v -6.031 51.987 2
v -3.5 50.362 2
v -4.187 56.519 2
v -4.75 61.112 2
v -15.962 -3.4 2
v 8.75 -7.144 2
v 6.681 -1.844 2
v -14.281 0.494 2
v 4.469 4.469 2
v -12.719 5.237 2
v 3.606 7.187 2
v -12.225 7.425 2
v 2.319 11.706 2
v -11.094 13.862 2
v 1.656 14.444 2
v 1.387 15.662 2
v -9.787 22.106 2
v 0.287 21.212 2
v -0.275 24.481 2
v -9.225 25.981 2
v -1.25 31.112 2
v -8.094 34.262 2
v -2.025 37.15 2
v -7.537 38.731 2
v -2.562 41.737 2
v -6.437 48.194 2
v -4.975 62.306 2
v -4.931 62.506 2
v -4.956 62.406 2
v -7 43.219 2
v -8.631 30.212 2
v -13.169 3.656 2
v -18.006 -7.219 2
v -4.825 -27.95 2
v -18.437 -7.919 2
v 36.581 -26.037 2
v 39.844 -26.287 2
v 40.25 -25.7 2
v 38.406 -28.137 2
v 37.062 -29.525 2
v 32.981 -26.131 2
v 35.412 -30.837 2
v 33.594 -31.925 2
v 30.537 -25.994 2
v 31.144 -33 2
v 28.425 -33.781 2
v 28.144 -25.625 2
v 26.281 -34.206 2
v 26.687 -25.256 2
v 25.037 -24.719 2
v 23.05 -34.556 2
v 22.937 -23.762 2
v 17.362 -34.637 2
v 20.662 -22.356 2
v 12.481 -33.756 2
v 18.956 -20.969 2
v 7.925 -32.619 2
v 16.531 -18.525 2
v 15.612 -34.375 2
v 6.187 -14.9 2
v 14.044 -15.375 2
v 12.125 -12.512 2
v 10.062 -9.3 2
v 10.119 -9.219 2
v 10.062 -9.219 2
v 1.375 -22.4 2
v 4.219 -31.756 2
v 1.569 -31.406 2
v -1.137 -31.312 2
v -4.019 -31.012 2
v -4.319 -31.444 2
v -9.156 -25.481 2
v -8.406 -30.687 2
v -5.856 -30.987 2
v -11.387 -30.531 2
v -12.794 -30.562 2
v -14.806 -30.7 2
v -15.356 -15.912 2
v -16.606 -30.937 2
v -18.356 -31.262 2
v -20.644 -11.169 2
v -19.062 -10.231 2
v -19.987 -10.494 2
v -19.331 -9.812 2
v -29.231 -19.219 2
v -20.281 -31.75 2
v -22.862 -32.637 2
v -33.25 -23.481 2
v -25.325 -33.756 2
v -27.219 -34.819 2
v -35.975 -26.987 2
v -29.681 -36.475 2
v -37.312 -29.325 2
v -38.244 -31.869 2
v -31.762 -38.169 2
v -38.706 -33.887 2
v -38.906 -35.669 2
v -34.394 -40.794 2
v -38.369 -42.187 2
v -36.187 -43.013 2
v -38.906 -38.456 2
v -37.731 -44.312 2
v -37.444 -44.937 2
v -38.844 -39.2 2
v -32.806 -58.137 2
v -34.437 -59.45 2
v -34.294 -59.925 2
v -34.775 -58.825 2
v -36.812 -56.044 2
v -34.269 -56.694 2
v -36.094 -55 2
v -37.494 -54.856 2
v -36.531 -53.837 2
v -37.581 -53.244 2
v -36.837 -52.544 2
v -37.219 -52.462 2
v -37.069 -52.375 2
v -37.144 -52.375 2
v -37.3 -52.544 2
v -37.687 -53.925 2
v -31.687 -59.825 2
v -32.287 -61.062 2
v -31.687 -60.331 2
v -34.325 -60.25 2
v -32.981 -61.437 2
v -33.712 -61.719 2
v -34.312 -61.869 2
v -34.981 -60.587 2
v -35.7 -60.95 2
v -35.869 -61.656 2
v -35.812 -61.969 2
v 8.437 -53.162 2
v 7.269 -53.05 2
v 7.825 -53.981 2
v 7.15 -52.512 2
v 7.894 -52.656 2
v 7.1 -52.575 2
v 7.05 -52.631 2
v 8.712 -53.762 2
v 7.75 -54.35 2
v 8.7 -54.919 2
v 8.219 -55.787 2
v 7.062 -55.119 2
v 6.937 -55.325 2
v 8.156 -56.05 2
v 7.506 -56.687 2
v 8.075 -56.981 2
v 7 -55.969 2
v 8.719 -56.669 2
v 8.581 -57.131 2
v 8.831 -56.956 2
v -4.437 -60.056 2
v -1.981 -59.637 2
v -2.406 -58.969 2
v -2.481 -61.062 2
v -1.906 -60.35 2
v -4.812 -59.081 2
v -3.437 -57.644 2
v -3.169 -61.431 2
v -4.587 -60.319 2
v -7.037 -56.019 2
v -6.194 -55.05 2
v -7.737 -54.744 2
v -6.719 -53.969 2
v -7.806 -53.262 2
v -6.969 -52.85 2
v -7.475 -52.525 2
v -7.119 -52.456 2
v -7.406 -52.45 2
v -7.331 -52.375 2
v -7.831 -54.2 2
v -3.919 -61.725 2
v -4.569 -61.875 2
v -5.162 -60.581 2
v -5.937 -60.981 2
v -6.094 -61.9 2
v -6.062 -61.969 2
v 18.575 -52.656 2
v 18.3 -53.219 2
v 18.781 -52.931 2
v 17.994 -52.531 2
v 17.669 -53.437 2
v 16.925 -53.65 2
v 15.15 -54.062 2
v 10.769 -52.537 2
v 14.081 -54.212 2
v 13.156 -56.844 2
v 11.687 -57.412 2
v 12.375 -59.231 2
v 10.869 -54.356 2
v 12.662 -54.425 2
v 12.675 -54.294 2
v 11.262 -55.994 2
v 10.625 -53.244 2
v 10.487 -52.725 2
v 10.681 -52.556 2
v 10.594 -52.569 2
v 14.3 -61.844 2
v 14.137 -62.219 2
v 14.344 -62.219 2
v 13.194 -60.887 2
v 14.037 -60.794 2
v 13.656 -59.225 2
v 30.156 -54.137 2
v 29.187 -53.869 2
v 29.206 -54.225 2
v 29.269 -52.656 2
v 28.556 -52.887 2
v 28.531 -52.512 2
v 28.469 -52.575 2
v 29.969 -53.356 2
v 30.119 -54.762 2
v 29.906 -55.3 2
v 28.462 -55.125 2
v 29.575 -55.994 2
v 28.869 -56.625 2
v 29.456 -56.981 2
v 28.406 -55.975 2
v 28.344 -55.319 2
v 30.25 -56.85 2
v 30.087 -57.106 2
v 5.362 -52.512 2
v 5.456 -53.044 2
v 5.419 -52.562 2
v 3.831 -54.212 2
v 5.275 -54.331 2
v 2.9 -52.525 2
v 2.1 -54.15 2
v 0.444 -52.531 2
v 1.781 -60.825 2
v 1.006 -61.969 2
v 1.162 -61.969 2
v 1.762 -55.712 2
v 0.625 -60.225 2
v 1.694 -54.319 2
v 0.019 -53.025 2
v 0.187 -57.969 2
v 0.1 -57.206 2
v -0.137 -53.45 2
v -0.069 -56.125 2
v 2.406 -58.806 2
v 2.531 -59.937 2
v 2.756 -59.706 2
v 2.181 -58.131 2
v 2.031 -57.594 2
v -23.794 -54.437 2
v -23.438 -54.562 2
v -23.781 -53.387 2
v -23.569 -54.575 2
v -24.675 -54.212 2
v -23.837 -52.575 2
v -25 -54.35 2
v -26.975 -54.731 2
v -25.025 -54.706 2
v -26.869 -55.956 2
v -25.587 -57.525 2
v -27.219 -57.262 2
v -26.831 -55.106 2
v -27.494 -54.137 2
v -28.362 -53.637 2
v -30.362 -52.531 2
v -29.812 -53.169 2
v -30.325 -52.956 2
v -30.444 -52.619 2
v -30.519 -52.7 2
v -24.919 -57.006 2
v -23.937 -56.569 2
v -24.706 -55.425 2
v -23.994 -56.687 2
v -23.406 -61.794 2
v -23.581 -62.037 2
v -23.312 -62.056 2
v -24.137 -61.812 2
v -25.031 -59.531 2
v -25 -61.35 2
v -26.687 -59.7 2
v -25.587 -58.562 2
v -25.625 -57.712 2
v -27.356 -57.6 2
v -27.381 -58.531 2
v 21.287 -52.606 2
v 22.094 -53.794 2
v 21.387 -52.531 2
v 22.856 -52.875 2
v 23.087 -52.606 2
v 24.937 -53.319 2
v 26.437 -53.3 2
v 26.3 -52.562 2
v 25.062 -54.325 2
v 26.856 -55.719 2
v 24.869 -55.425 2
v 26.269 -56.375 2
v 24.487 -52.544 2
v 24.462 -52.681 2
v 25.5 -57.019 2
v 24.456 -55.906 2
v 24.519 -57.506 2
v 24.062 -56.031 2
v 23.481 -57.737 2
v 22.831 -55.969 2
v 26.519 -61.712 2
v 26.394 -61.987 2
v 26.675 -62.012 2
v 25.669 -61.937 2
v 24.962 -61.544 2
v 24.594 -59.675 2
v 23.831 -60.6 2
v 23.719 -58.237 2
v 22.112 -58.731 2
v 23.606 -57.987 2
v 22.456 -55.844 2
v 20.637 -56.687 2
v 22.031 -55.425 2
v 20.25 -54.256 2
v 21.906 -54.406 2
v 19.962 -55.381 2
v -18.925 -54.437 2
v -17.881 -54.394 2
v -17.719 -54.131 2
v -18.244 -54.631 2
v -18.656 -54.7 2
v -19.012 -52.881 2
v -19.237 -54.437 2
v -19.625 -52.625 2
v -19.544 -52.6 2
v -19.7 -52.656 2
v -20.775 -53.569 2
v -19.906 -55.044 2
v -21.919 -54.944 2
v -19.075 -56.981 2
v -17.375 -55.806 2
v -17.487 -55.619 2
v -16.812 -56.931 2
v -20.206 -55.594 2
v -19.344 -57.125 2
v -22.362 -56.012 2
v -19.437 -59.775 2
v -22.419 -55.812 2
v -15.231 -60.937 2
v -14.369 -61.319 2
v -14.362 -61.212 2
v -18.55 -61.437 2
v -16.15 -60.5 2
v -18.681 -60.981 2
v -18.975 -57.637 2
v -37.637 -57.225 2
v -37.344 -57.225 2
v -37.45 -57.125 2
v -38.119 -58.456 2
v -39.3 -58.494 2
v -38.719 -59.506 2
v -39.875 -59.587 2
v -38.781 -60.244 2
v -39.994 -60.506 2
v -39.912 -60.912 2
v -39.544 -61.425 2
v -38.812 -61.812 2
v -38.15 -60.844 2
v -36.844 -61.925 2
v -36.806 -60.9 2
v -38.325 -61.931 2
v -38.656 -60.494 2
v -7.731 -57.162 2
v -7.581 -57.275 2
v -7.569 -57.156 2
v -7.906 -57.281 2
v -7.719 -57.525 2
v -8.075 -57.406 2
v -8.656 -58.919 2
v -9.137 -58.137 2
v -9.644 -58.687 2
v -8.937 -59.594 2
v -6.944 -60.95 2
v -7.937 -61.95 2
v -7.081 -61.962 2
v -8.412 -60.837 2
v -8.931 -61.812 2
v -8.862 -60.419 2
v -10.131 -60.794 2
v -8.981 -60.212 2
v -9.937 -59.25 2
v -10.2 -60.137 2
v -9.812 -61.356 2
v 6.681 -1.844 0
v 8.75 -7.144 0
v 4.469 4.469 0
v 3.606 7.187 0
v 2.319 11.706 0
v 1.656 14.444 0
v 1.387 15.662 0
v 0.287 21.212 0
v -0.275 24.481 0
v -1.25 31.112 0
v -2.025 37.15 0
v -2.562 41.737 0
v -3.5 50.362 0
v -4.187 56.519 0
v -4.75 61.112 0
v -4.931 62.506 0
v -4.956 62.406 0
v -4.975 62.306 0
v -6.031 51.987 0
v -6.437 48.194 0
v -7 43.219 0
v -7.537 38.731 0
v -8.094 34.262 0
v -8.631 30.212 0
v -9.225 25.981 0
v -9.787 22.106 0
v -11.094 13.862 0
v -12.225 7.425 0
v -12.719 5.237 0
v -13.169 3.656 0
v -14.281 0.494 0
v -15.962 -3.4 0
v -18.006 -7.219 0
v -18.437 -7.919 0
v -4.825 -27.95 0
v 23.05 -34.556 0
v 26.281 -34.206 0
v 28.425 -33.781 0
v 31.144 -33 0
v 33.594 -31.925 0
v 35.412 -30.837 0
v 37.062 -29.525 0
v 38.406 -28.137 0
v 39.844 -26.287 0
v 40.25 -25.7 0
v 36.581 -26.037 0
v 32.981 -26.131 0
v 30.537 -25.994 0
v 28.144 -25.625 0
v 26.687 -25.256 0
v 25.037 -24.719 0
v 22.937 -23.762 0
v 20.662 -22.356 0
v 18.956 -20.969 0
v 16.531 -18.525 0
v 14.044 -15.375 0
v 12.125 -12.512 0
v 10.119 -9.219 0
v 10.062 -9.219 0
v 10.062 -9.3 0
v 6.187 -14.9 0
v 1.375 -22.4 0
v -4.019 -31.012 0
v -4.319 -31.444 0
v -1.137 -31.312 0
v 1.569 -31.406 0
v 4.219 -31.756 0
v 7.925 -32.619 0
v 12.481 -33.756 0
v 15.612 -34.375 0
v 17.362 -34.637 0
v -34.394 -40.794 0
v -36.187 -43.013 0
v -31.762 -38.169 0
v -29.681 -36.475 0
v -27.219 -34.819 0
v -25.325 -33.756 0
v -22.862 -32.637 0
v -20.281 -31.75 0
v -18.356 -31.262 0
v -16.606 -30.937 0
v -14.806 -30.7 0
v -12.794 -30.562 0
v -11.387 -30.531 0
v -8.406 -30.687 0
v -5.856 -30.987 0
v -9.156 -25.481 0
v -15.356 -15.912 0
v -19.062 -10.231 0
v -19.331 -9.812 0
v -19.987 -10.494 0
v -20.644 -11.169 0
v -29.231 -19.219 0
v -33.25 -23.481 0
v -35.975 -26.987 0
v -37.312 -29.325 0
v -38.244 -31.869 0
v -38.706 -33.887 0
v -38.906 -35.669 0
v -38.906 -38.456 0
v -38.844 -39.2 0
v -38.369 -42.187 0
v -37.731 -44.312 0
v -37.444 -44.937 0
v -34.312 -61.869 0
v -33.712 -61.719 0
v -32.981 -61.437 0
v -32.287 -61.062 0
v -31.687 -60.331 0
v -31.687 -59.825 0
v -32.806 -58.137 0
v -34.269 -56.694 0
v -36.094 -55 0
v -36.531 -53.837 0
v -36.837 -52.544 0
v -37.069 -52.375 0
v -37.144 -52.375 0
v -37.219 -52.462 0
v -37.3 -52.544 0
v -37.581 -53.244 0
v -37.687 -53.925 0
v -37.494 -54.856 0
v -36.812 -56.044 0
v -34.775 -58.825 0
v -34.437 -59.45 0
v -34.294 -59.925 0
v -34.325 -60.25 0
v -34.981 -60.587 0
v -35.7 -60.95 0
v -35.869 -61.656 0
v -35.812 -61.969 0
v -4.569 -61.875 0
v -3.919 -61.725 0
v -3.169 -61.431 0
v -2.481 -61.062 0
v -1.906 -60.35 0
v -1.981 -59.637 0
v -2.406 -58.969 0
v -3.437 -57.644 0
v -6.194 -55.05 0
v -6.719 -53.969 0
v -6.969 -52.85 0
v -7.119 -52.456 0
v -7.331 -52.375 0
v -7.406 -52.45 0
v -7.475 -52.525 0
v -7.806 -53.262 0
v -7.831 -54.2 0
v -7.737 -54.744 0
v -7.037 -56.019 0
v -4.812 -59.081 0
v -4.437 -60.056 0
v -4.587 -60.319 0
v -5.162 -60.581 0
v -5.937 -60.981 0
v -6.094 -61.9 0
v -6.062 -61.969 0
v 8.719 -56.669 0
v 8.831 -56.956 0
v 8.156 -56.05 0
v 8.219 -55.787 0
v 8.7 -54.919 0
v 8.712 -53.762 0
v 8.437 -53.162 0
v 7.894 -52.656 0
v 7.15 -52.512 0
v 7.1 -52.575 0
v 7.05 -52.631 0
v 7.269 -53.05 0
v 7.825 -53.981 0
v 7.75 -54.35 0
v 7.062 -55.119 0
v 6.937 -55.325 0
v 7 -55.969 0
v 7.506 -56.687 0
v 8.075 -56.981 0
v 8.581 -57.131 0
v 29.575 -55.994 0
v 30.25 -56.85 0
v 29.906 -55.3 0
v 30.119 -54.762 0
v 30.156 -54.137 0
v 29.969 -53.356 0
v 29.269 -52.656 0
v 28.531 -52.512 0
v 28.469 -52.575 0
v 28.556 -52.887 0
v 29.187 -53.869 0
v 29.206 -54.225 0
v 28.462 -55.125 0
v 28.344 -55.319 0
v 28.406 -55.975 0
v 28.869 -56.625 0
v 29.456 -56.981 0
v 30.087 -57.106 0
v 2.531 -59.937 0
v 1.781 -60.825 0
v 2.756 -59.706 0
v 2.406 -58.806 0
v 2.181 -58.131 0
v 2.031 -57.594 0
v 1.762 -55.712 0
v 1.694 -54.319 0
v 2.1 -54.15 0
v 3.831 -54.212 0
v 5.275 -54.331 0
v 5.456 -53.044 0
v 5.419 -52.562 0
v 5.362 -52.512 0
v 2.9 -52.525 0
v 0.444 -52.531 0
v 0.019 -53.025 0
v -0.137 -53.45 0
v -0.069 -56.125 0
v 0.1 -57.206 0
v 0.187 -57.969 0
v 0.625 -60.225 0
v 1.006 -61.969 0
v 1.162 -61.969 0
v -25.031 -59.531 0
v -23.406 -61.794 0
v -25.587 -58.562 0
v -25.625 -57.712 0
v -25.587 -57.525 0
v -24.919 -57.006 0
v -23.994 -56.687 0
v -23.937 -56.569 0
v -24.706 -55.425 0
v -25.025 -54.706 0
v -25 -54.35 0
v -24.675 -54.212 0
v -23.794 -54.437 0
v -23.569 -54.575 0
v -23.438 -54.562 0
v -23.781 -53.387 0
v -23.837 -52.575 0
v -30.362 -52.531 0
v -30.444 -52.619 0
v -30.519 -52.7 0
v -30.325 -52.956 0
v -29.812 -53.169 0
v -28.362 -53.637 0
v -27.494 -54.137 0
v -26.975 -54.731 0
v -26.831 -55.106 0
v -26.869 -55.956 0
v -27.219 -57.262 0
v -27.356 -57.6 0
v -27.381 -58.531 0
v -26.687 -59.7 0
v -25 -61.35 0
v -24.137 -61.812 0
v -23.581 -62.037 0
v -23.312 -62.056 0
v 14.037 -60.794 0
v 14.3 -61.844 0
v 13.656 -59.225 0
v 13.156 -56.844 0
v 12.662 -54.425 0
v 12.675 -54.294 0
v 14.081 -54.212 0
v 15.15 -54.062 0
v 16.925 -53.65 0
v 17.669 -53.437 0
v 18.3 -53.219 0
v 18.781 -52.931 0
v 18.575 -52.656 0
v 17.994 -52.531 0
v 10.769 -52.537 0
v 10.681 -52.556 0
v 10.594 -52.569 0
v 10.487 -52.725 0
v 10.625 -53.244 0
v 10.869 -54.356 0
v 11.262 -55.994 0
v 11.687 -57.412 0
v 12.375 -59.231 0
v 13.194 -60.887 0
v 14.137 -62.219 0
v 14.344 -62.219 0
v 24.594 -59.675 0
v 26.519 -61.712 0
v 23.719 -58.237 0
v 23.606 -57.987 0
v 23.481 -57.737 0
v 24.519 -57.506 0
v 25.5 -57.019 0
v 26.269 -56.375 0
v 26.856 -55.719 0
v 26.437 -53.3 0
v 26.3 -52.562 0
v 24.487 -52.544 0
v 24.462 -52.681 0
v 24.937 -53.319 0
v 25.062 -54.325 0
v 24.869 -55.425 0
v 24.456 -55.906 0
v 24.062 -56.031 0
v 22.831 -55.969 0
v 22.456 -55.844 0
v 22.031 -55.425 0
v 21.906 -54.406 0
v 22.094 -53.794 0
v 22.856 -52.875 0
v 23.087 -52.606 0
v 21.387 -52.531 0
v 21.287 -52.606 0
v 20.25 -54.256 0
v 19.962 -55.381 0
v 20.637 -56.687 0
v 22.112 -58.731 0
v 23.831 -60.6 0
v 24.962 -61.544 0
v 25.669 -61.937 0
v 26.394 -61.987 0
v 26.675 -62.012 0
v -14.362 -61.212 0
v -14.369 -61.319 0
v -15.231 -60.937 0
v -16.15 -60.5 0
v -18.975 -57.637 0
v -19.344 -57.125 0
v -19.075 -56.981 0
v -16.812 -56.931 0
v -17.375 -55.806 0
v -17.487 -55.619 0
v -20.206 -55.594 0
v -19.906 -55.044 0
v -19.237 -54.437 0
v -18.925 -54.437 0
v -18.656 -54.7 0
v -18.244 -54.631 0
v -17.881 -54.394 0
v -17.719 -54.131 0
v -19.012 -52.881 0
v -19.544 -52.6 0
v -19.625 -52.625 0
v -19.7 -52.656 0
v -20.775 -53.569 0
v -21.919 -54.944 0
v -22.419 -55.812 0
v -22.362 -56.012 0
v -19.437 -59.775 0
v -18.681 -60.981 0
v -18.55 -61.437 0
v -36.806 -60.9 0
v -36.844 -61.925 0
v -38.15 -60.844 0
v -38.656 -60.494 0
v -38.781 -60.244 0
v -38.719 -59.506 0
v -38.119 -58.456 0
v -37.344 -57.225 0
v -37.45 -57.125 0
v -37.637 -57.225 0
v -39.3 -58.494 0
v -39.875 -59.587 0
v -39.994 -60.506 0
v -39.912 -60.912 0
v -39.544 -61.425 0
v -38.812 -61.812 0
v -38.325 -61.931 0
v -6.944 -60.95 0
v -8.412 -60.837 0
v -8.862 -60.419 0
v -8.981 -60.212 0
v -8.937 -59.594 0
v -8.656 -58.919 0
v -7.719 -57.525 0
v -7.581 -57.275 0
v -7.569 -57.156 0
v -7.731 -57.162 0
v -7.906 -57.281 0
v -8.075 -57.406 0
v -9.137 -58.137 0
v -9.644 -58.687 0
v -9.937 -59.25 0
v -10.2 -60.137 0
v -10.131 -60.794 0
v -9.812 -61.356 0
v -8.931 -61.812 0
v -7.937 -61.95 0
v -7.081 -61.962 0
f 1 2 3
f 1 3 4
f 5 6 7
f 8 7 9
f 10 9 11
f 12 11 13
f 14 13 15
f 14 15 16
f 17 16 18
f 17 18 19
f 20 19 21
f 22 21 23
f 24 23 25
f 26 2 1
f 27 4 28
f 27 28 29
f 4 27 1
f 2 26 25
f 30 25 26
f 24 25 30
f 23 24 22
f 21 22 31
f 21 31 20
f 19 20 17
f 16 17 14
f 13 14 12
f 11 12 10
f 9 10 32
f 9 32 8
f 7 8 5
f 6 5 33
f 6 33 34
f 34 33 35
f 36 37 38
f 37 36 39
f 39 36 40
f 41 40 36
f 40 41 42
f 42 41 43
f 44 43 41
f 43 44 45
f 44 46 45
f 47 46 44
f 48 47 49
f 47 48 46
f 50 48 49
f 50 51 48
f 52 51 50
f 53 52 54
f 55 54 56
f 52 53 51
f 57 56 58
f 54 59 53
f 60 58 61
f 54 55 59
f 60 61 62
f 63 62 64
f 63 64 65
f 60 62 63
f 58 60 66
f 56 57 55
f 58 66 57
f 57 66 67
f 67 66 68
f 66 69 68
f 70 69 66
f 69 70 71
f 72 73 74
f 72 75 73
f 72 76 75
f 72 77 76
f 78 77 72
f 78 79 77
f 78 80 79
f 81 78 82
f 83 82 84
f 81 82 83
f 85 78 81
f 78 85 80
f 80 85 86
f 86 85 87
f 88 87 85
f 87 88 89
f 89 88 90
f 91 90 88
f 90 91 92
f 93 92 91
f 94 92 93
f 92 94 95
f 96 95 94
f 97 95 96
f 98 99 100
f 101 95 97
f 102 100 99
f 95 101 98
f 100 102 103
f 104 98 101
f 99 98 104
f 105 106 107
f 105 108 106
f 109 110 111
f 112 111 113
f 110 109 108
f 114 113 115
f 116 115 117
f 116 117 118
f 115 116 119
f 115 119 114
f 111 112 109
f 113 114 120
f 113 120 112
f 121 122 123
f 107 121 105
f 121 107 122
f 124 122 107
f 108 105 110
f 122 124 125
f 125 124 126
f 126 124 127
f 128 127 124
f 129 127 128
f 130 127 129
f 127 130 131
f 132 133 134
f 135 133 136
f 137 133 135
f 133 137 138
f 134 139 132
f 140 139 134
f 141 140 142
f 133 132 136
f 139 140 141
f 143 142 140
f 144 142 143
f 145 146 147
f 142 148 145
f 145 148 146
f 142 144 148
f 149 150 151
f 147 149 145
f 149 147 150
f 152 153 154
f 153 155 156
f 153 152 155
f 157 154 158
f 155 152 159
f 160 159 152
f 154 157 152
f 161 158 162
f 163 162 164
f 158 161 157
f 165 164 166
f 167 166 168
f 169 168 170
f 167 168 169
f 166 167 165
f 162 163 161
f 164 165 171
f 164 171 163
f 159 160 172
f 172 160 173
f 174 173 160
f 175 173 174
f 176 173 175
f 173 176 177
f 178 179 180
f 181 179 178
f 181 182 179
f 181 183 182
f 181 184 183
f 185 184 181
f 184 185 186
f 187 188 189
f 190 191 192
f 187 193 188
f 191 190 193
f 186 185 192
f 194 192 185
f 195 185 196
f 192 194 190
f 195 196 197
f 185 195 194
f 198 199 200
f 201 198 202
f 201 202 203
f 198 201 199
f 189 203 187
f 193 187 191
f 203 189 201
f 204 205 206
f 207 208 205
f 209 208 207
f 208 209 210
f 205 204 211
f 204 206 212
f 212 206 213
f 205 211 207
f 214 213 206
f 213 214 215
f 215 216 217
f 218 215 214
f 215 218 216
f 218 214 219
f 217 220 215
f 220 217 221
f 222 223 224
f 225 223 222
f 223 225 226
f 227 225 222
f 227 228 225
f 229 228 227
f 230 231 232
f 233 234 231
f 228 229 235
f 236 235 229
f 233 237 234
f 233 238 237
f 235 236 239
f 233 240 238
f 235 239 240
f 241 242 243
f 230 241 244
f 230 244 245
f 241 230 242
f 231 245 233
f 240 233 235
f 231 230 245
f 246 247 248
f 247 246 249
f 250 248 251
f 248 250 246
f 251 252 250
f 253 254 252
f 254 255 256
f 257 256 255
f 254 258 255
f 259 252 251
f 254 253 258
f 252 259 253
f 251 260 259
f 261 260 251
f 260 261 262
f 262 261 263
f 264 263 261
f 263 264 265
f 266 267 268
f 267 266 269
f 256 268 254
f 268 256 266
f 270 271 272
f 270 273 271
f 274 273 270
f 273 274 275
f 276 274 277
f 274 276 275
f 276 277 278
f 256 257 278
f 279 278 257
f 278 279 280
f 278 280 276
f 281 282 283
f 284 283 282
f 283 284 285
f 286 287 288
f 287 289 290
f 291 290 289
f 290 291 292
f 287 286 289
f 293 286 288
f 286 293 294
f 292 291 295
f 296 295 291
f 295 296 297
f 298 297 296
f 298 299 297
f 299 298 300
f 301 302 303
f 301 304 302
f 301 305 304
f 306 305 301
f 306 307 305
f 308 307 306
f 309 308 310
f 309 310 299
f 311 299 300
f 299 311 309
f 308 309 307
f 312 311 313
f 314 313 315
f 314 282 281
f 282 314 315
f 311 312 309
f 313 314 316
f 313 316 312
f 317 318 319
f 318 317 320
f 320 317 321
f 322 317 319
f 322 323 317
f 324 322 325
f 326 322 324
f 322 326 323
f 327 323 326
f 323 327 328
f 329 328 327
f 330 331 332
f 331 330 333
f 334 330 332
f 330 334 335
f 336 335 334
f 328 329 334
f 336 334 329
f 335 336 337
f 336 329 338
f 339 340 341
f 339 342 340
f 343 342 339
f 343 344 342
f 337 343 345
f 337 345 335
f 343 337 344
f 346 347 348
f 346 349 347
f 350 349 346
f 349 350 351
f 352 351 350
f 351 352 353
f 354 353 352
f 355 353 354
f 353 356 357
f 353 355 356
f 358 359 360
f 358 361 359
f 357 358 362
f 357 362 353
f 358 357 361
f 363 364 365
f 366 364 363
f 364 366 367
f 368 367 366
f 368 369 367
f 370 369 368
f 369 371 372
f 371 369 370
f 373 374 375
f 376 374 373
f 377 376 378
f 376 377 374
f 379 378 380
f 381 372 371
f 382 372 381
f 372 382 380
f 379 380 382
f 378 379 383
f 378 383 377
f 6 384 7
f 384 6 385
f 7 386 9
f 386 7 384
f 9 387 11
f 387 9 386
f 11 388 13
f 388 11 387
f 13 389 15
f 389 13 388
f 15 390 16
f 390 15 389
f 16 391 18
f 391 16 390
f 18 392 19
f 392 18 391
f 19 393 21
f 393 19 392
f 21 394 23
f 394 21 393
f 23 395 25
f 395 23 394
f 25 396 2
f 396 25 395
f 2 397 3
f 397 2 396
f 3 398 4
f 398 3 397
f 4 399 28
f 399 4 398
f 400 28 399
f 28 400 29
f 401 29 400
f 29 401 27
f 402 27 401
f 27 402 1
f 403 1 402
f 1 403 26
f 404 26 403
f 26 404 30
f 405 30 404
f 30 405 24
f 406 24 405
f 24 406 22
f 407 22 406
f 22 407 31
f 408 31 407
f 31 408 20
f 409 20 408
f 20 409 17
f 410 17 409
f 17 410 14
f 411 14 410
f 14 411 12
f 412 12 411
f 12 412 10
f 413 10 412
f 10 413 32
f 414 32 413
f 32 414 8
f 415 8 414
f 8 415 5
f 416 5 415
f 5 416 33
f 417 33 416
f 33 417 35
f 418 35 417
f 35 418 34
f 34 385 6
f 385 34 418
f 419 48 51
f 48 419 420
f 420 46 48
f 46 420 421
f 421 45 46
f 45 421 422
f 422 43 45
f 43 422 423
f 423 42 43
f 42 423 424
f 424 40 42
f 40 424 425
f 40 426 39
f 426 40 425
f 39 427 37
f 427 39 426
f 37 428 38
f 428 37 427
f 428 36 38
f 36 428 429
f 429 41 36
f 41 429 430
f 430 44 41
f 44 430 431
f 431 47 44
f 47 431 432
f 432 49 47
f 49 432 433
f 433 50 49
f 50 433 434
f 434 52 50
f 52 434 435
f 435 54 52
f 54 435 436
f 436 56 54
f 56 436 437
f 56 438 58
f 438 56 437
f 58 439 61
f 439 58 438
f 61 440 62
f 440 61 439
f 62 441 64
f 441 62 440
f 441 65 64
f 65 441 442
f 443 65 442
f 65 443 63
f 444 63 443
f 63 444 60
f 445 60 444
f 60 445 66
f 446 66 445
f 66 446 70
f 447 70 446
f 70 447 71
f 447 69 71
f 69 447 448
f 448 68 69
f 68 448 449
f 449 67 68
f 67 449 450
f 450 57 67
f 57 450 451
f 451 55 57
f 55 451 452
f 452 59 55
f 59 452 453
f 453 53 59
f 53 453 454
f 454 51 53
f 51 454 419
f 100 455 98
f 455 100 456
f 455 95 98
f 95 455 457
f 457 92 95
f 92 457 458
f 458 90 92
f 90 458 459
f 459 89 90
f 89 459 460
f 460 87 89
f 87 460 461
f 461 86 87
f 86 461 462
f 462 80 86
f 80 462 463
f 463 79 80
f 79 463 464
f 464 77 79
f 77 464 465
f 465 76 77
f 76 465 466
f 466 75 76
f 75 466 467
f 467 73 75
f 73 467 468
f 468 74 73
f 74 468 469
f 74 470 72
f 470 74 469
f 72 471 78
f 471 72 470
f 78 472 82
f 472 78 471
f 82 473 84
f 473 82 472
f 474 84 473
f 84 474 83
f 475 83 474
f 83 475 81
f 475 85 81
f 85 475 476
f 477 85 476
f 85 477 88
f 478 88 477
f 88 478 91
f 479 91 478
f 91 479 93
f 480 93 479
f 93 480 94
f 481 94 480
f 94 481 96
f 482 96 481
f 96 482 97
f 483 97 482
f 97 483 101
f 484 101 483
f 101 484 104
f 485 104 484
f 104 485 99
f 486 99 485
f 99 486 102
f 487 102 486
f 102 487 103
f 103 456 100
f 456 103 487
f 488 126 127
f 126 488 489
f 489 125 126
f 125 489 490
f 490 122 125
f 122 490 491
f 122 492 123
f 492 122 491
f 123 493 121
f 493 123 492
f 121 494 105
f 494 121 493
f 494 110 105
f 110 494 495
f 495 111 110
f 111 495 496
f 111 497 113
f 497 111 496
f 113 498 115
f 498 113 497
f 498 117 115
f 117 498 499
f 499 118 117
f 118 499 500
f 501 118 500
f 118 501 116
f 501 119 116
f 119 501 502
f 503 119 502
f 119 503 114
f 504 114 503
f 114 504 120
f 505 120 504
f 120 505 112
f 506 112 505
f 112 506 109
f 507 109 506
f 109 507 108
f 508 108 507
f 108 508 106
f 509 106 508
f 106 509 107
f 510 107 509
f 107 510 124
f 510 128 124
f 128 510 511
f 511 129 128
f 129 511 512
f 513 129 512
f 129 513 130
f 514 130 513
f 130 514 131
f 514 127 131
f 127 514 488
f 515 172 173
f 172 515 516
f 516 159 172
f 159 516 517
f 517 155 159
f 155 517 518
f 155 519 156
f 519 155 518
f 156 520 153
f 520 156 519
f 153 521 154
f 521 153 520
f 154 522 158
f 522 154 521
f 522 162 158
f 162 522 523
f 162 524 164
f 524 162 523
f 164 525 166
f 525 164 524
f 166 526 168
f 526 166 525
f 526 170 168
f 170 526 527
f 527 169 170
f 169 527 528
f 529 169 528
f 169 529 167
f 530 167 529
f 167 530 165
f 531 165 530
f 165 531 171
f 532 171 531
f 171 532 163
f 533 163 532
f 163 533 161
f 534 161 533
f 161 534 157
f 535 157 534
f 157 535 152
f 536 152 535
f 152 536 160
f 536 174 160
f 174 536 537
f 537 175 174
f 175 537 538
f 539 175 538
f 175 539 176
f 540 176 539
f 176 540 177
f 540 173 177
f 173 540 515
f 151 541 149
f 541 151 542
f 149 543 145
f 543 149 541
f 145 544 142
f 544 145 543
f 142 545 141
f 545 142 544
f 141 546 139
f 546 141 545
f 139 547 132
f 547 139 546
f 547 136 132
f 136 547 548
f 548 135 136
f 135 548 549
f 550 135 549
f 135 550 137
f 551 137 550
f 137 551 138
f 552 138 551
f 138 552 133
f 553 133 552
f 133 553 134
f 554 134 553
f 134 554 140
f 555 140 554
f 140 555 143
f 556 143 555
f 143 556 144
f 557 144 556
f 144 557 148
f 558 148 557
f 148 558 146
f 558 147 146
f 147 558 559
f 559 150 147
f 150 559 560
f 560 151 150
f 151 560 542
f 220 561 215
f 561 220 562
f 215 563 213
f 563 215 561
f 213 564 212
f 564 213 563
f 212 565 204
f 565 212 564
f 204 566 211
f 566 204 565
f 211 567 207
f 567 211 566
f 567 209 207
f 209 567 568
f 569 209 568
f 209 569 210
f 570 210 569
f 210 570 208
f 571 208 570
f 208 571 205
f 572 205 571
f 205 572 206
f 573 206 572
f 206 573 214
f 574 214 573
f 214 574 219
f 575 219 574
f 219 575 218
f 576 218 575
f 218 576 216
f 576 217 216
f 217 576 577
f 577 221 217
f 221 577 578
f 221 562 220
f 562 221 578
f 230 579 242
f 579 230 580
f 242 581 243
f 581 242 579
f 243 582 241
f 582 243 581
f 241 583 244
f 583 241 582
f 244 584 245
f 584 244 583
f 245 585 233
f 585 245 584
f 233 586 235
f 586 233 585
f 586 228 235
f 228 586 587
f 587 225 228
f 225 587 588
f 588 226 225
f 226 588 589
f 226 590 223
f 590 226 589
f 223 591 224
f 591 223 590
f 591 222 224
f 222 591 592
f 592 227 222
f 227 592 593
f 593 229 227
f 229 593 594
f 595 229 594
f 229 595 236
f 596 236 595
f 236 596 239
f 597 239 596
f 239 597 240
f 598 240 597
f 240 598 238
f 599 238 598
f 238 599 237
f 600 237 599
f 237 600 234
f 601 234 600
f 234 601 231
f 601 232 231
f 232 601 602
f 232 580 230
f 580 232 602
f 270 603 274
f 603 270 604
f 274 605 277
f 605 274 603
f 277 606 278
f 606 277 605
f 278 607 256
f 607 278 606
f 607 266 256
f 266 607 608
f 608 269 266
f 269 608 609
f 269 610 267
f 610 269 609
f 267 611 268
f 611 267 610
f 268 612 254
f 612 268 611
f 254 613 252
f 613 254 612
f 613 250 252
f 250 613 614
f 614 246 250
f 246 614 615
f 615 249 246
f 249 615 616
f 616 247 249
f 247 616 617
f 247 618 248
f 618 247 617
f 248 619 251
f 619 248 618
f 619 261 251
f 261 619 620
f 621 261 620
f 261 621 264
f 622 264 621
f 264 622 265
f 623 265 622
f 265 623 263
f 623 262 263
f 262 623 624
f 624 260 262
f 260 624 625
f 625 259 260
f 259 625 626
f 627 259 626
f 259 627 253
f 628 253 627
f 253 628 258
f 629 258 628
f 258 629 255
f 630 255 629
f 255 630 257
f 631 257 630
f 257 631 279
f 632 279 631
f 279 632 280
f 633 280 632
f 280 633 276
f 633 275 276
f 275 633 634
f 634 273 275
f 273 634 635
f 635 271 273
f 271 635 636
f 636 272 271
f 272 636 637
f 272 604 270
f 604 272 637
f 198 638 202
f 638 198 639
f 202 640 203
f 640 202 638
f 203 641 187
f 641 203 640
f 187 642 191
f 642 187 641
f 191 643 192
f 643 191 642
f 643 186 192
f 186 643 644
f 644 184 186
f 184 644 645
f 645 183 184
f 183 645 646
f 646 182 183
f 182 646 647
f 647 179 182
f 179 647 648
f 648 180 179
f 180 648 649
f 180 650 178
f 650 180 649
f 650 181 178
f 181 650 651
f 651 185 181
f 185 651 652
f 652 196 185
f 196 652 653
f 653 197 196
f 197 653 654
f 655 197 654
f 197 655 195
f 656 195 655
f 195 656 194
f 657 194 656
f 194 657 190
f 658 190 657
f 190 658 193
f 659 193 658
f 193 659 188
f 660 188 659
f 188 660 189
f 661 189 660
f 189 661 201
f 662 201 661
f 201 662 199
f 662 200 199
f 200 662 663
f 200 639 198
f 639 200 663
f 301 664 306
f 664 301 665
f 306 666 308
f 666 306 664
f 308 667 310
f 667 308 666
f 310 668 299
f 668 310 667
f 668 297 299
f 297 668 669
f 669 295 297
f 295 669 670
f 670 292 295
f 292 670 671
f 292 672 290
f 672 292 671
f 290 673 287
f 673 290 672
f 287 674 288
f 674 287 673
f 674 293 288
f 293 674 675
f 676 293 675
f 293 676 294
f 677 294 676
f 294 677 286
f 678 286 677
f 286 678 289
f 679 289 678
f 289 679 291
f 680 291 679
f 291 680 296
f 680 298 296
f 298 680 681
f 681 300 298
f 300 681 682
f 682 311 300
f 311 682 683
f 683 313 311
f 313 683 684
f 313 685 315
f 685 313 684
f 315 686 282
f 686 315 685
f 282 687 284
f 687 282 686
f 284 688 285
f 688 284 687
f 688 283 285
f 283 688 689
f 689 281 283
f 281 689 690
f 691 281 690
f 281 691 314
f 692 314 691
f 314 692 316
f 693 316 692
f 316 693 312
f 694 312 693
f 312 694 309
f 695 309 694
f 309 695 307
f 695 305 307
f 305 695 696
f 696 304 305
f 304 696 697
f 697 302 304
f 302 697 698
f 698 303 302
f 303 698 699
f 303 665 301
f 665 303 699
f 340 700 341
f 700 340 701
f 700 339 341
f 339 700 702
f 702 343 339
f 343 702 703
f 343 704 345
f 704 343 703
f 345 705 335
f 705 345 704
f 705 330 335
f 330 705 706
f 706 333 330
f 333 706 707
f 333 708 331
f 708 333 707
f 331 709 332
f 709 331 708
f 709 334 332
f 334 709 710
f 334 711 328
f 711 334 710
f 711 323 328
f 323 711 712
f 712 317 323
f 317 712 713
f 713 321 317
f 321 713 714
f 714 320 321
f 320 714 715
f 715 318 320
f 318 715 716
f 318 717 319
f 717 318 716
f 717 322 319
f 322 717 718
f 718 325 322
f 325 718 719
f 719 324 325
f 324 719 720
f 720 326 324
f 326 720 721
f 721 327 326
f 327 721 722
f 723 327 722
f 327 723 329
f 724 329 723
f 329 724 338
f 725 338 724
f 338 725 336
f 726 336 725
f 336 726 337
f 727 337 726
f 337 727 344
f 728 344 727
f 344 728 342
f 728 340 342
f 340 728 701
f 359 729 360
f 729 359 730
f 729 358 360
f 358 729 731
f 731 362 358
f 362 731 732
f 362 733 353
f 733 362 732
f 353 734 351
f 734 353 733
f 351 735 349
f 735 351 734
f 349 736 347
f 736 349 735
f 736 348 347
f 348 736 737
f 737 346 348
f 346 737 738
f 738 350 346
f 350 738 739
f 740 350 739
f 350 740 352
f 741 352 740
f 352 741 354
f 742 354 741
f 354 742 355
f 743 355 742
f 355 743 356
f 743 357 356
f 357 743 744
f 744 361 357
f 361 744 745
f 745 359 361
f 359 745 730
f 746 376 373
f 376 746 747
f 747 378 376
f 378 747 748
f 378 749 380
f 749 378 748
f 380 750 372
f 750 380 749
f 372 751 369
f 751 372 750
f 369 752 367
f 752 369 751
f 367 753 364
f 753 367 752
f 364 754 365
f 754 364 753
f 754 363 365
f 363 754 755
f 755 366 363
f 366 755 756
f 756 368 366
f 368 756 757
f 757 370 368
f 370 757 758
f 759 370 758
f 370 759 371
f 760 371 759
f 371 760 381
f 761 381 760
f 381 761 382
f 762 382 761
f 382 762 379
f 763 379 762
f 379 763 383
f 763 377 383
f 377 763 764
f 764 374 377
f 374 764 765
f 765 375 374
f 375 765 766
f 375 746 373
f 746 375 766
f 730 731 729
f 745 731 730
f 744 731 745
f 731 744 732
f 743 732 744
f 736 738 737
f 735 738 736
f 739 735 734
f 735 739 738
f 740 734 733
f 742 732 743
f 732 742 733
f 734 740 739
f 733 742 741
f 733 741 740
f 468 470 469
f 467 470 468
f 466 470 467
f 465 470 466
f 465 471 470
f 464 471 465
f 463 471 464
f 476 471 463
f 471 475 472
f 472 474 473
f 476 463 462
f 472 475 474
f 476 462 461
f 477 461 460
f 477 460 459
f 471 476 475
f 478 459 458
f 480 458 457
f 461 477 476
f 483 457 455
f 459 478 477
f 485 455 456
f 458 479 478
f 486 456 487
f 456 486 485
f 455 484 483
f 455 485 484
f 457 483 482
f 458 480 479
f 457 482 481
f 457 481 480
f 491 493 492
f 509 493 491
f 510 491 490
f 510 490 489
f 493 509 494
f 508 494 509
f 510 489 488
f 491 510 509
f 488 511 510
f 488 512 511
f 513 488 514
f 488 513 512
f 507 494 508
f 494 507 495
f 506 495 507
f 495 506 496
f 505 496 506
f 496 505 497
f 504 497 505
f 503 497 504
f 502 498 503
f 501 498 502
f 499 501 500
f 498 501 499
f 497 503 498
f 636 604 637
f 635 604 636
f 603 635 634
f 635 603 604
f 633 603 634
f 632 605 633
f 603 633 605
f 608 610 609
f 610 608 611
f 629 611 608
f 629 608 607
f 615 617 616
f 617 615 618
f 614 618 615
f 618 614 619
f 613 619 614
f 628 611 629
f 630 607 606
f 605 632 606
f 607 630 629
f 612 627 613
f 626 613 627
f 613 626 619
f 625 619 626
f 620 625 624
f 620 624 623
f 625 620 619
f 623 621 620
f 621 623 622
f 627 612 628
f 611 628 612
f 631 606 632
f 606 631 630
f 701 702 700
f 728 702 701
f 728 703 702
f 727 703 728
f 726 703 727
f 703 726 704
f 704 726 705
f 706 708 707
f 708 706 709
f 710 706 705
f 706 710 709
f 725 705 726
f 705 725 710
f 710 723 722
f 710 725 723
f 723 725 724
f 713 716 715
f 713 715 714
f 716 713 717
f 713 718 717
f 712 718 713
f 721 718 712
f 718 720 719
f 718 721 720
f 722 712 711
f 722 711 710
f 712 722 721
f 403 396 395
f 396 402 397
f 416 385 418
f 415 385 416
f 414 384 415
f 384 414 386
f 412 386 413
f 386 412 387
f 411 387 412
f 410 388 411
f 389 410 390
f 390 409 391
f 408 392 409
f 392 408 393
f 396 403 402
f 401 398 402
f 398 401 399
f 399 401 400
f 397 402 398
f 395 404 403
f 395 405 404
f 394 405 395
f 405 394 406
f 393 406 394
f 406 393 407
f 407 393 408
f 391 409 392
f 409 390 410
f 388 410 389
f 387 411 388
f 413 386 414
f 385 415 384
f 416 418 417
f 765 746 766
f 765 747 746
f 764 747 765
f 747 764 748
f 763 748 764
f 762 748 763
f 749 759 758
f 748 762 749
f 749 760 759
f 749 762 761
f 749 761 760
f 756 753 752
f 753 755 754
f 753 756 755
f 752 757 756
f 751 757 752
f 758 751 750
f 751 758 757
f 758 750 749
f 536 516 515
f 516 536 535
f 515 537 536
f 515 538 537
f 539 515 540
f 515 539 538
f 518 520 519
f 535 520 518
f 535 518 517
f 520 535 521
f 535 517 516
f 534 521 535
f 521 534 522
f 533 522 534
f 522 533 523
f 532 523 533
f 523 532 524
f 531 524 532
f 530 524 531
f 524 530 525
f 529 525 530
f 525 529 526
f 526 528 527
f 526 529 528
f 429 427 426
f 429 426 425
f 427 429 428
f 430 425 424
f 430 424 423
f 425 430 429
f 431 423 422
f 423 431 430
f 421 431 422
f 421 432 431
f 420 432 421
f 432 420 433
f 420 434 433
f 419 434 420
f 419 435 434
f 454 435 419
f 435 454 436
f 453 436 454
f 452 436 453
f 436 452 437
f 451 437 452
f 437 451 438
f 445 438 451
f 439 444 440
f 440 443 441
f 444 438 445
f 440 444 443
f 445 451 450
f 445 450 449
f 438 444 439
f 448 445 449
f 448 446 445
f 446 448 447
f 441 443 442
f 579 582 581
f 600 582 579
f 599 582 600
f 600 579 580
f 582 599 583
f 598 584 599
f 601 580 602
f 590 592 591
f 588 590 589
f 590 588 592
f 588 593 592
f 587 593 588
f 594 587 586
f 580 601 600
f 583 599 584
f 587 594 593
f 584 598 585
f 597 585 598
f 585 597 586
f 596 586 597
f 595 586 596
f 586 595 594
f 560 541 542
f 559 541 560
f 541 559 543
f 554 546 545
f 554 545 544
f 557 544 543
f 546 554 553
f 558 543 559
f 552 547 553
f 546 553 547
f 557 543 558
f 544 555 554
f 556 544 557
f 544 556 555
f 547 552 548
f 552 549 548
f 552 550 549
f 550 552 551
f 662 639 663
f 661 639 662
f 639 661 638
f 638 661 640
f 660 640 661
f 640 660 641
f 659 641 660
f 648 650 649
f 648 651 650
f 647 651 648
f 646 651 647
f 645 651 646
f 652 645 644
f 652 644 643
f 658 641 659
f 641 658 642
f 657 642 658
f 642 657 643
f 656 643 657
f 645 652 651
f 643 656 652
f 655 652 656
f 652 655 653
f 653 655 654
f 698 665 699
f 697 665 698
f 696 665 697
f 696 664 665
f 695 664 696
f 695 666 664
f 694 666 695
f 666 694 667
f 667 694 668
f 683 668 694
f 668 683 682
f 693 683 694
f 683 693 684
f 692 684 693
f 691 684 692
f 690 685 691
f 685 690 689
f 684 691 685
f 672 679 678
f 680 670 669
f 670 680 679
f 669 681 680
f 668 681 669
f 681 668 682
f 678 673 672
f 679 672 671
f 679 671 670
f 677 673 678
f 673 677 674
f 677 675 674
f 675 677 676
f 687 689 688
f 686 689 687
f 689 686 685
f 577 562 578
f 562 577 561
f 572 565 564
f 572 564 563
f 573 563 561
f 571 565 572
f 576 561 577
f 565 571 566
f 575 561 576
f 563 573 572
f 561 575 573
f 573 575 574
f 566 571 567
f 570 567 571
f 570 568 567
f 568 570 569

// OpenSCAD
module aa5916005fd0afefef9589ed355f0371_1()
{
 /* Generated by trace2scad version 20150415
    http://aggregate.org/MAKE/TRACE2SCAD/
    Optimized model has 387/4796 original points
 */
 color([0.48, 0.48, 0.48])
 assign(minx=0) /* polygon minx=39 */
 assign(miny=0) /* polygon miny=45 */
 assign(maxx=12880) /* polygon maxx=12880 */
 assign(maxy=20000) /* polygon maxy=20001 */
 assign(dx=maxx-minx)
 assign(dy=maxy-miny)
 assign(maxd=((dx>dy)?dx:dy))
 scale([1/maxd, 1/maxd, 1])
 translate([-minx-dx/2, -miny-dy/2, 0])
 linear_extrude(height=1, convexity=387)
 union() {
  union() {
   polygon([[5647,19985],[5644,19969],[5475,18318],[5410,17711],[5320,16915],[5234,16197],[5145,15482],[5059,14834],[4964,14157],[4874,13537],[4665,12218],[4484,11188],[4405,10838],[4333,10585],[4155,10079],[3886,9456],[3559,8845],[3490,8733],[5668,5528],[7840,8857],[7509,9705],[7155,10715],[7017,11150],[6811,11873],[6705,12311],[6662,12506],[6486,13394],[6396,13917],[6240,14978],[6116,15944],[6030,16678],[5880,18058],[5770,19043],[5680,19778],[5651,20001]], convexity=6);
   polygon([[8050,8518],[8050,8512],[7430,7616],[6660,6416],[5797,5038],[5749,4969],[6258,4990],[6691,4975],[7115,4919],[7708,4781],[8437,4599],[8938,4500],[9218,4458],[10128,4471],[10645,4527],[10988,4595],[11423,4720],[11815,4892],[12106,5066],[12370,5276],[12585,5498],[12815,5794],[12880,5888],[12293,5834],[11717,5819],[11326,5841],[10943,5900],[10710,5959],[10446,6045],[10110,6198],[9746,6423],[9473,6645],[9085,7036],[8687,7540],[8380,7998],[8059,8525],[8050,8525]], convexity=9);
   polygon([[3242,8321],[3137,8213],[1763,6925],[1120,6243],[684,5682],[470,5308],[321,4901],[247,4578],[215,4293],[215,3847],[225,3728],[301,3250],[403,2910],[449,2810],[650,3118],[937,3473],[1358,3893],[1691,4164],[2085,4429],[2388,4599],[2782,4778],[3195,4920],[3503,4998],[3783,5050],[4071,5088],[4393,5110],[4618,5115],[5095,5090],[5503,5042],[4975,5923],[3983,7454],[3390,8363],[3347,8430]], convexity=7);
   polygon([[485,1606],[472,1593],[427,1481],[410,1372],[441,1223],[550,1033],[876,588],[930,488],[953,412],[948,360],[843,306],[728,248],[701,135],[710,85],[950,101],[1046,125],[1163,170],[1274,230],[1370,347],[1370,428],[1191,698],[957,929],[665,1200],[595,1386],[546,1593],[509,1620],[497,1620]], convexity=8);
   polygon([[5255,1608],[5244,1596],[5191,1478],[5187,1328],[5202,1241],[5314,1037],[5670,547],[5730,391],[5706,349],[5614,307],[5490,243],[5465,96],[5470,85],[5709,100],[5813,124],[5933,171],[6043,230],[6135,344],[6123,458],[6055,565],[5890,777],[5449,1192],[5365,1365],[5325,1544],[5301,1607],[5267,1620]], convexity=8);
   polygon([[6904,1596],[6511,1595],[6443,1516],[6418,1448],[6429,1020],[6456,847],[6470,725],[6540,364],[6601,85],[6626,85],[6725,268],[6845,410],[6881,447],[6825,591],[6789,699],[6765,785],[6722,1086],[6711,1309],[6776,1336],[7053,1326],[7284,1307],[7313,1513],[7307,1590],[7298,1598]], convexity=10);
   polygon([[7576,1588],[7568,1579],[7603,1512],[7692,1363],[7680,1304],[7570,1181],[7550,1148],[7560,1045],[7641,930],[7732,883],[7813,859],[7853,887],[7835,933],[7745,1032],[7755,1074],[7832,1213],[7834,1398],[7790,1494],[7703,1575],[7584,1598]], convexity=10);
   polygon([[11000,1593],[10995,1588],[11009,1538],[11110,1381],[11113,1324],[10994,1180],[10975,1149],[10985,1044],[11059,940],[11153,883],[11254,863],[11280,904],[11172,1041],[11225,1152],[11259,1238],[11265,1338],[11235,1463],[11123,1575],[11005,1598]], convexity=10);
   polygon([[1569,1581],[1557,1568],[1588,1527],[1670,1493],[1902,1418],[2041,1338],[2124,1243],[2147,1183],[2141,1047],[2085,838],[2063,784],[2059,635],[2170,448],[2440,184],[2578,110],[2667,74],[2710,71],[2695,113],[2435,475],[2346,630],[2340,766],[2346,796],[2453,879],[2601,930],[2610,949],[2487,1132],[2436,1247],[2440,1304],[2492,1326],[2633,1290],[2669,1268],[2690,1270],[2635,1458],[2626,1588],[1582,1595]], convexity=13);
   polygon([[8149,1591],[8135,1589],[8118,1564],[8140,1481],[8179,1303],[8242,1041],[8310,814],[8420,523],[8551,258],[8702,45],[8735,45],[8728,105],[8686,273],[8625,524],[8545,905],[8466,1292],[8468,1313],[8693,1326],[8864,1350],[9148,1416],[9267,1450],[9368,1485],[9445,1531],[9412,1575],[9319,1595],[8163,1594]], convexity=9);
   polygon([[9854,1589],[9846,1583],[9680,1319],[9634,1139],[9742,930],[9978,603],[10253,304],[10434,153],[10547,90],[10663,82],[10708,78],[10683,126],[10375,452],[10235,682],[10217,722],[10197,762],[10363,799],[10520,877],[10643,980],[10737,1085],[10670,1472],[10648,1590],[10358,1593],[10354,1571],[10430,1469],[10450,1308],[10419,1132],[10353,1055],[10290,1035],[10093,1045],[10033,1065],[9965,1132],[9945,1295],[9975,1393],[10097,1540],[10134,1583],[9862,1595]], convexity=13);
   polygon([[3300,1580],[3288,1575],[3116,1429],[2933,1209],[2853,1070],[2862,1038],[3330,436],[3451,243],[3472,170],[4141,189],[4142,206],[4003,250],[3856,320],[3404,778],[3345,860],[3388,883],[3750,891],[3660,1071],[3642,1101],[3207,1105],[3255,1193],[3362,1290],[3412,1290],[3455,1248],[3521,1259],[3579,1297],[3605,1339],[3398,1539],[3313,1584]], convexity=12);
   polygon([[433,852],[418,844],[152,641],[60,466],[41,319],[54,254],[113,172],[230,110],[308,91],[545,92],[551,256],[336,265],[255,321],[235,361],[245,479],[341,647],[465,844],[448,860]], convexity=8);
   polygon([[5175,835],[5148,815],[4978,698],[4897,610],[4850,520],[4808,378],[4819,273],[4870,183],[5011,110],[5170,88],[5307,86],[5329,248],[5094,266],[5022,333],[5003,366],[5010,465],[5055,573],[5205,796],[5227,836],[5229,855],[5203,854]], convexity=8);
  }
 }
}

module aa5916005fd0afefef9589ed355f0371()
{
 /* all layers combined, scaled to within a 1mm cube */
 scale([1, 1, 1/1])
 difference() {
  union() {
   scale([1,1,2]) translate([0,0,-0.5]) aa5916005fd0afefef9589ed355f0371_1();
  }
  translate([0,0,-2]) cube([2,2,4],center=true);
 }
}

scale([125, 125, 2]) {
	aa5916005fd0afefef9589ed355f0371();
}
